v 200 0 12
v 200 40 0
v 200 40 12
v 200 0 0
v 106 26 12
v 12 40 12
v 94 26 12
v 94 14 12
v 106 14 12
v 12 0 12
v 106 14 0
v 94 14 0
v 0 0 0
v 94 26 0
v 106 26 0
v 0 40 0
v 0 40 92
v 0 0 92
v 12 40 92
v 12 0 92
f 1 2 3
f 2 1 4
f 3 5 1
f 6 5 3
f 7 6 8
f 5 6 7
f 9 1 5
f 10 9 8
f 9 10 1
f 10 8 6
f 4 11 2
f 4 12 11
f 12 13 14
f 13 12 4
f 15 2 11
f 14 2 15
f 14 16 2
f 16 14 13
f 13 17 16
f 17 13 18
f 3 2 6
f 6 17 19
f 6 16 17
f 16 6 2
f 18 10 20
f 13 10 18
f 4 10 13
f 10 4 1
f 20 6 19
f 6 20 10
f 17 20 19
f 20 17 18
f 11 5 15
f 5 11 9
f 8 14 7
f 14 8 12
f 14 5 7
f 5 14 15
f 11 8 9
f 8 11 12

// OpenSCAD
$fn = 32;

// ----------------------------------------------------------------------
// Gantry bracket: 200-250 mm L bracket
// ----------------------------------------------------------------------

// --- parameters (mm) ---
base_l = 200;             // base arm length, X
arm_w = 40;               // arm width, Y
thick = 12;               // arm thickness
up_h = 80;                // vertical arm height, Z
slot_w = 12;              // adjustment slot width in the base
fit_tol = 0.1;            // tolerance for press fits, mm
free_tol = 0.3;           // tolerance for clearance fits, mm

total_h = up_h + thick;  // overall height

difference() {
  union() {
    cube([base_l, arm_w, thick]);
    cube([thick, arm_w, total_h]);
  }
  translate([base_l / 2 - slot_w / 2, arm_w / 2 - slot_w / 2, -1])
    cube([slot_w, slot_w, thick + 2]);
}
